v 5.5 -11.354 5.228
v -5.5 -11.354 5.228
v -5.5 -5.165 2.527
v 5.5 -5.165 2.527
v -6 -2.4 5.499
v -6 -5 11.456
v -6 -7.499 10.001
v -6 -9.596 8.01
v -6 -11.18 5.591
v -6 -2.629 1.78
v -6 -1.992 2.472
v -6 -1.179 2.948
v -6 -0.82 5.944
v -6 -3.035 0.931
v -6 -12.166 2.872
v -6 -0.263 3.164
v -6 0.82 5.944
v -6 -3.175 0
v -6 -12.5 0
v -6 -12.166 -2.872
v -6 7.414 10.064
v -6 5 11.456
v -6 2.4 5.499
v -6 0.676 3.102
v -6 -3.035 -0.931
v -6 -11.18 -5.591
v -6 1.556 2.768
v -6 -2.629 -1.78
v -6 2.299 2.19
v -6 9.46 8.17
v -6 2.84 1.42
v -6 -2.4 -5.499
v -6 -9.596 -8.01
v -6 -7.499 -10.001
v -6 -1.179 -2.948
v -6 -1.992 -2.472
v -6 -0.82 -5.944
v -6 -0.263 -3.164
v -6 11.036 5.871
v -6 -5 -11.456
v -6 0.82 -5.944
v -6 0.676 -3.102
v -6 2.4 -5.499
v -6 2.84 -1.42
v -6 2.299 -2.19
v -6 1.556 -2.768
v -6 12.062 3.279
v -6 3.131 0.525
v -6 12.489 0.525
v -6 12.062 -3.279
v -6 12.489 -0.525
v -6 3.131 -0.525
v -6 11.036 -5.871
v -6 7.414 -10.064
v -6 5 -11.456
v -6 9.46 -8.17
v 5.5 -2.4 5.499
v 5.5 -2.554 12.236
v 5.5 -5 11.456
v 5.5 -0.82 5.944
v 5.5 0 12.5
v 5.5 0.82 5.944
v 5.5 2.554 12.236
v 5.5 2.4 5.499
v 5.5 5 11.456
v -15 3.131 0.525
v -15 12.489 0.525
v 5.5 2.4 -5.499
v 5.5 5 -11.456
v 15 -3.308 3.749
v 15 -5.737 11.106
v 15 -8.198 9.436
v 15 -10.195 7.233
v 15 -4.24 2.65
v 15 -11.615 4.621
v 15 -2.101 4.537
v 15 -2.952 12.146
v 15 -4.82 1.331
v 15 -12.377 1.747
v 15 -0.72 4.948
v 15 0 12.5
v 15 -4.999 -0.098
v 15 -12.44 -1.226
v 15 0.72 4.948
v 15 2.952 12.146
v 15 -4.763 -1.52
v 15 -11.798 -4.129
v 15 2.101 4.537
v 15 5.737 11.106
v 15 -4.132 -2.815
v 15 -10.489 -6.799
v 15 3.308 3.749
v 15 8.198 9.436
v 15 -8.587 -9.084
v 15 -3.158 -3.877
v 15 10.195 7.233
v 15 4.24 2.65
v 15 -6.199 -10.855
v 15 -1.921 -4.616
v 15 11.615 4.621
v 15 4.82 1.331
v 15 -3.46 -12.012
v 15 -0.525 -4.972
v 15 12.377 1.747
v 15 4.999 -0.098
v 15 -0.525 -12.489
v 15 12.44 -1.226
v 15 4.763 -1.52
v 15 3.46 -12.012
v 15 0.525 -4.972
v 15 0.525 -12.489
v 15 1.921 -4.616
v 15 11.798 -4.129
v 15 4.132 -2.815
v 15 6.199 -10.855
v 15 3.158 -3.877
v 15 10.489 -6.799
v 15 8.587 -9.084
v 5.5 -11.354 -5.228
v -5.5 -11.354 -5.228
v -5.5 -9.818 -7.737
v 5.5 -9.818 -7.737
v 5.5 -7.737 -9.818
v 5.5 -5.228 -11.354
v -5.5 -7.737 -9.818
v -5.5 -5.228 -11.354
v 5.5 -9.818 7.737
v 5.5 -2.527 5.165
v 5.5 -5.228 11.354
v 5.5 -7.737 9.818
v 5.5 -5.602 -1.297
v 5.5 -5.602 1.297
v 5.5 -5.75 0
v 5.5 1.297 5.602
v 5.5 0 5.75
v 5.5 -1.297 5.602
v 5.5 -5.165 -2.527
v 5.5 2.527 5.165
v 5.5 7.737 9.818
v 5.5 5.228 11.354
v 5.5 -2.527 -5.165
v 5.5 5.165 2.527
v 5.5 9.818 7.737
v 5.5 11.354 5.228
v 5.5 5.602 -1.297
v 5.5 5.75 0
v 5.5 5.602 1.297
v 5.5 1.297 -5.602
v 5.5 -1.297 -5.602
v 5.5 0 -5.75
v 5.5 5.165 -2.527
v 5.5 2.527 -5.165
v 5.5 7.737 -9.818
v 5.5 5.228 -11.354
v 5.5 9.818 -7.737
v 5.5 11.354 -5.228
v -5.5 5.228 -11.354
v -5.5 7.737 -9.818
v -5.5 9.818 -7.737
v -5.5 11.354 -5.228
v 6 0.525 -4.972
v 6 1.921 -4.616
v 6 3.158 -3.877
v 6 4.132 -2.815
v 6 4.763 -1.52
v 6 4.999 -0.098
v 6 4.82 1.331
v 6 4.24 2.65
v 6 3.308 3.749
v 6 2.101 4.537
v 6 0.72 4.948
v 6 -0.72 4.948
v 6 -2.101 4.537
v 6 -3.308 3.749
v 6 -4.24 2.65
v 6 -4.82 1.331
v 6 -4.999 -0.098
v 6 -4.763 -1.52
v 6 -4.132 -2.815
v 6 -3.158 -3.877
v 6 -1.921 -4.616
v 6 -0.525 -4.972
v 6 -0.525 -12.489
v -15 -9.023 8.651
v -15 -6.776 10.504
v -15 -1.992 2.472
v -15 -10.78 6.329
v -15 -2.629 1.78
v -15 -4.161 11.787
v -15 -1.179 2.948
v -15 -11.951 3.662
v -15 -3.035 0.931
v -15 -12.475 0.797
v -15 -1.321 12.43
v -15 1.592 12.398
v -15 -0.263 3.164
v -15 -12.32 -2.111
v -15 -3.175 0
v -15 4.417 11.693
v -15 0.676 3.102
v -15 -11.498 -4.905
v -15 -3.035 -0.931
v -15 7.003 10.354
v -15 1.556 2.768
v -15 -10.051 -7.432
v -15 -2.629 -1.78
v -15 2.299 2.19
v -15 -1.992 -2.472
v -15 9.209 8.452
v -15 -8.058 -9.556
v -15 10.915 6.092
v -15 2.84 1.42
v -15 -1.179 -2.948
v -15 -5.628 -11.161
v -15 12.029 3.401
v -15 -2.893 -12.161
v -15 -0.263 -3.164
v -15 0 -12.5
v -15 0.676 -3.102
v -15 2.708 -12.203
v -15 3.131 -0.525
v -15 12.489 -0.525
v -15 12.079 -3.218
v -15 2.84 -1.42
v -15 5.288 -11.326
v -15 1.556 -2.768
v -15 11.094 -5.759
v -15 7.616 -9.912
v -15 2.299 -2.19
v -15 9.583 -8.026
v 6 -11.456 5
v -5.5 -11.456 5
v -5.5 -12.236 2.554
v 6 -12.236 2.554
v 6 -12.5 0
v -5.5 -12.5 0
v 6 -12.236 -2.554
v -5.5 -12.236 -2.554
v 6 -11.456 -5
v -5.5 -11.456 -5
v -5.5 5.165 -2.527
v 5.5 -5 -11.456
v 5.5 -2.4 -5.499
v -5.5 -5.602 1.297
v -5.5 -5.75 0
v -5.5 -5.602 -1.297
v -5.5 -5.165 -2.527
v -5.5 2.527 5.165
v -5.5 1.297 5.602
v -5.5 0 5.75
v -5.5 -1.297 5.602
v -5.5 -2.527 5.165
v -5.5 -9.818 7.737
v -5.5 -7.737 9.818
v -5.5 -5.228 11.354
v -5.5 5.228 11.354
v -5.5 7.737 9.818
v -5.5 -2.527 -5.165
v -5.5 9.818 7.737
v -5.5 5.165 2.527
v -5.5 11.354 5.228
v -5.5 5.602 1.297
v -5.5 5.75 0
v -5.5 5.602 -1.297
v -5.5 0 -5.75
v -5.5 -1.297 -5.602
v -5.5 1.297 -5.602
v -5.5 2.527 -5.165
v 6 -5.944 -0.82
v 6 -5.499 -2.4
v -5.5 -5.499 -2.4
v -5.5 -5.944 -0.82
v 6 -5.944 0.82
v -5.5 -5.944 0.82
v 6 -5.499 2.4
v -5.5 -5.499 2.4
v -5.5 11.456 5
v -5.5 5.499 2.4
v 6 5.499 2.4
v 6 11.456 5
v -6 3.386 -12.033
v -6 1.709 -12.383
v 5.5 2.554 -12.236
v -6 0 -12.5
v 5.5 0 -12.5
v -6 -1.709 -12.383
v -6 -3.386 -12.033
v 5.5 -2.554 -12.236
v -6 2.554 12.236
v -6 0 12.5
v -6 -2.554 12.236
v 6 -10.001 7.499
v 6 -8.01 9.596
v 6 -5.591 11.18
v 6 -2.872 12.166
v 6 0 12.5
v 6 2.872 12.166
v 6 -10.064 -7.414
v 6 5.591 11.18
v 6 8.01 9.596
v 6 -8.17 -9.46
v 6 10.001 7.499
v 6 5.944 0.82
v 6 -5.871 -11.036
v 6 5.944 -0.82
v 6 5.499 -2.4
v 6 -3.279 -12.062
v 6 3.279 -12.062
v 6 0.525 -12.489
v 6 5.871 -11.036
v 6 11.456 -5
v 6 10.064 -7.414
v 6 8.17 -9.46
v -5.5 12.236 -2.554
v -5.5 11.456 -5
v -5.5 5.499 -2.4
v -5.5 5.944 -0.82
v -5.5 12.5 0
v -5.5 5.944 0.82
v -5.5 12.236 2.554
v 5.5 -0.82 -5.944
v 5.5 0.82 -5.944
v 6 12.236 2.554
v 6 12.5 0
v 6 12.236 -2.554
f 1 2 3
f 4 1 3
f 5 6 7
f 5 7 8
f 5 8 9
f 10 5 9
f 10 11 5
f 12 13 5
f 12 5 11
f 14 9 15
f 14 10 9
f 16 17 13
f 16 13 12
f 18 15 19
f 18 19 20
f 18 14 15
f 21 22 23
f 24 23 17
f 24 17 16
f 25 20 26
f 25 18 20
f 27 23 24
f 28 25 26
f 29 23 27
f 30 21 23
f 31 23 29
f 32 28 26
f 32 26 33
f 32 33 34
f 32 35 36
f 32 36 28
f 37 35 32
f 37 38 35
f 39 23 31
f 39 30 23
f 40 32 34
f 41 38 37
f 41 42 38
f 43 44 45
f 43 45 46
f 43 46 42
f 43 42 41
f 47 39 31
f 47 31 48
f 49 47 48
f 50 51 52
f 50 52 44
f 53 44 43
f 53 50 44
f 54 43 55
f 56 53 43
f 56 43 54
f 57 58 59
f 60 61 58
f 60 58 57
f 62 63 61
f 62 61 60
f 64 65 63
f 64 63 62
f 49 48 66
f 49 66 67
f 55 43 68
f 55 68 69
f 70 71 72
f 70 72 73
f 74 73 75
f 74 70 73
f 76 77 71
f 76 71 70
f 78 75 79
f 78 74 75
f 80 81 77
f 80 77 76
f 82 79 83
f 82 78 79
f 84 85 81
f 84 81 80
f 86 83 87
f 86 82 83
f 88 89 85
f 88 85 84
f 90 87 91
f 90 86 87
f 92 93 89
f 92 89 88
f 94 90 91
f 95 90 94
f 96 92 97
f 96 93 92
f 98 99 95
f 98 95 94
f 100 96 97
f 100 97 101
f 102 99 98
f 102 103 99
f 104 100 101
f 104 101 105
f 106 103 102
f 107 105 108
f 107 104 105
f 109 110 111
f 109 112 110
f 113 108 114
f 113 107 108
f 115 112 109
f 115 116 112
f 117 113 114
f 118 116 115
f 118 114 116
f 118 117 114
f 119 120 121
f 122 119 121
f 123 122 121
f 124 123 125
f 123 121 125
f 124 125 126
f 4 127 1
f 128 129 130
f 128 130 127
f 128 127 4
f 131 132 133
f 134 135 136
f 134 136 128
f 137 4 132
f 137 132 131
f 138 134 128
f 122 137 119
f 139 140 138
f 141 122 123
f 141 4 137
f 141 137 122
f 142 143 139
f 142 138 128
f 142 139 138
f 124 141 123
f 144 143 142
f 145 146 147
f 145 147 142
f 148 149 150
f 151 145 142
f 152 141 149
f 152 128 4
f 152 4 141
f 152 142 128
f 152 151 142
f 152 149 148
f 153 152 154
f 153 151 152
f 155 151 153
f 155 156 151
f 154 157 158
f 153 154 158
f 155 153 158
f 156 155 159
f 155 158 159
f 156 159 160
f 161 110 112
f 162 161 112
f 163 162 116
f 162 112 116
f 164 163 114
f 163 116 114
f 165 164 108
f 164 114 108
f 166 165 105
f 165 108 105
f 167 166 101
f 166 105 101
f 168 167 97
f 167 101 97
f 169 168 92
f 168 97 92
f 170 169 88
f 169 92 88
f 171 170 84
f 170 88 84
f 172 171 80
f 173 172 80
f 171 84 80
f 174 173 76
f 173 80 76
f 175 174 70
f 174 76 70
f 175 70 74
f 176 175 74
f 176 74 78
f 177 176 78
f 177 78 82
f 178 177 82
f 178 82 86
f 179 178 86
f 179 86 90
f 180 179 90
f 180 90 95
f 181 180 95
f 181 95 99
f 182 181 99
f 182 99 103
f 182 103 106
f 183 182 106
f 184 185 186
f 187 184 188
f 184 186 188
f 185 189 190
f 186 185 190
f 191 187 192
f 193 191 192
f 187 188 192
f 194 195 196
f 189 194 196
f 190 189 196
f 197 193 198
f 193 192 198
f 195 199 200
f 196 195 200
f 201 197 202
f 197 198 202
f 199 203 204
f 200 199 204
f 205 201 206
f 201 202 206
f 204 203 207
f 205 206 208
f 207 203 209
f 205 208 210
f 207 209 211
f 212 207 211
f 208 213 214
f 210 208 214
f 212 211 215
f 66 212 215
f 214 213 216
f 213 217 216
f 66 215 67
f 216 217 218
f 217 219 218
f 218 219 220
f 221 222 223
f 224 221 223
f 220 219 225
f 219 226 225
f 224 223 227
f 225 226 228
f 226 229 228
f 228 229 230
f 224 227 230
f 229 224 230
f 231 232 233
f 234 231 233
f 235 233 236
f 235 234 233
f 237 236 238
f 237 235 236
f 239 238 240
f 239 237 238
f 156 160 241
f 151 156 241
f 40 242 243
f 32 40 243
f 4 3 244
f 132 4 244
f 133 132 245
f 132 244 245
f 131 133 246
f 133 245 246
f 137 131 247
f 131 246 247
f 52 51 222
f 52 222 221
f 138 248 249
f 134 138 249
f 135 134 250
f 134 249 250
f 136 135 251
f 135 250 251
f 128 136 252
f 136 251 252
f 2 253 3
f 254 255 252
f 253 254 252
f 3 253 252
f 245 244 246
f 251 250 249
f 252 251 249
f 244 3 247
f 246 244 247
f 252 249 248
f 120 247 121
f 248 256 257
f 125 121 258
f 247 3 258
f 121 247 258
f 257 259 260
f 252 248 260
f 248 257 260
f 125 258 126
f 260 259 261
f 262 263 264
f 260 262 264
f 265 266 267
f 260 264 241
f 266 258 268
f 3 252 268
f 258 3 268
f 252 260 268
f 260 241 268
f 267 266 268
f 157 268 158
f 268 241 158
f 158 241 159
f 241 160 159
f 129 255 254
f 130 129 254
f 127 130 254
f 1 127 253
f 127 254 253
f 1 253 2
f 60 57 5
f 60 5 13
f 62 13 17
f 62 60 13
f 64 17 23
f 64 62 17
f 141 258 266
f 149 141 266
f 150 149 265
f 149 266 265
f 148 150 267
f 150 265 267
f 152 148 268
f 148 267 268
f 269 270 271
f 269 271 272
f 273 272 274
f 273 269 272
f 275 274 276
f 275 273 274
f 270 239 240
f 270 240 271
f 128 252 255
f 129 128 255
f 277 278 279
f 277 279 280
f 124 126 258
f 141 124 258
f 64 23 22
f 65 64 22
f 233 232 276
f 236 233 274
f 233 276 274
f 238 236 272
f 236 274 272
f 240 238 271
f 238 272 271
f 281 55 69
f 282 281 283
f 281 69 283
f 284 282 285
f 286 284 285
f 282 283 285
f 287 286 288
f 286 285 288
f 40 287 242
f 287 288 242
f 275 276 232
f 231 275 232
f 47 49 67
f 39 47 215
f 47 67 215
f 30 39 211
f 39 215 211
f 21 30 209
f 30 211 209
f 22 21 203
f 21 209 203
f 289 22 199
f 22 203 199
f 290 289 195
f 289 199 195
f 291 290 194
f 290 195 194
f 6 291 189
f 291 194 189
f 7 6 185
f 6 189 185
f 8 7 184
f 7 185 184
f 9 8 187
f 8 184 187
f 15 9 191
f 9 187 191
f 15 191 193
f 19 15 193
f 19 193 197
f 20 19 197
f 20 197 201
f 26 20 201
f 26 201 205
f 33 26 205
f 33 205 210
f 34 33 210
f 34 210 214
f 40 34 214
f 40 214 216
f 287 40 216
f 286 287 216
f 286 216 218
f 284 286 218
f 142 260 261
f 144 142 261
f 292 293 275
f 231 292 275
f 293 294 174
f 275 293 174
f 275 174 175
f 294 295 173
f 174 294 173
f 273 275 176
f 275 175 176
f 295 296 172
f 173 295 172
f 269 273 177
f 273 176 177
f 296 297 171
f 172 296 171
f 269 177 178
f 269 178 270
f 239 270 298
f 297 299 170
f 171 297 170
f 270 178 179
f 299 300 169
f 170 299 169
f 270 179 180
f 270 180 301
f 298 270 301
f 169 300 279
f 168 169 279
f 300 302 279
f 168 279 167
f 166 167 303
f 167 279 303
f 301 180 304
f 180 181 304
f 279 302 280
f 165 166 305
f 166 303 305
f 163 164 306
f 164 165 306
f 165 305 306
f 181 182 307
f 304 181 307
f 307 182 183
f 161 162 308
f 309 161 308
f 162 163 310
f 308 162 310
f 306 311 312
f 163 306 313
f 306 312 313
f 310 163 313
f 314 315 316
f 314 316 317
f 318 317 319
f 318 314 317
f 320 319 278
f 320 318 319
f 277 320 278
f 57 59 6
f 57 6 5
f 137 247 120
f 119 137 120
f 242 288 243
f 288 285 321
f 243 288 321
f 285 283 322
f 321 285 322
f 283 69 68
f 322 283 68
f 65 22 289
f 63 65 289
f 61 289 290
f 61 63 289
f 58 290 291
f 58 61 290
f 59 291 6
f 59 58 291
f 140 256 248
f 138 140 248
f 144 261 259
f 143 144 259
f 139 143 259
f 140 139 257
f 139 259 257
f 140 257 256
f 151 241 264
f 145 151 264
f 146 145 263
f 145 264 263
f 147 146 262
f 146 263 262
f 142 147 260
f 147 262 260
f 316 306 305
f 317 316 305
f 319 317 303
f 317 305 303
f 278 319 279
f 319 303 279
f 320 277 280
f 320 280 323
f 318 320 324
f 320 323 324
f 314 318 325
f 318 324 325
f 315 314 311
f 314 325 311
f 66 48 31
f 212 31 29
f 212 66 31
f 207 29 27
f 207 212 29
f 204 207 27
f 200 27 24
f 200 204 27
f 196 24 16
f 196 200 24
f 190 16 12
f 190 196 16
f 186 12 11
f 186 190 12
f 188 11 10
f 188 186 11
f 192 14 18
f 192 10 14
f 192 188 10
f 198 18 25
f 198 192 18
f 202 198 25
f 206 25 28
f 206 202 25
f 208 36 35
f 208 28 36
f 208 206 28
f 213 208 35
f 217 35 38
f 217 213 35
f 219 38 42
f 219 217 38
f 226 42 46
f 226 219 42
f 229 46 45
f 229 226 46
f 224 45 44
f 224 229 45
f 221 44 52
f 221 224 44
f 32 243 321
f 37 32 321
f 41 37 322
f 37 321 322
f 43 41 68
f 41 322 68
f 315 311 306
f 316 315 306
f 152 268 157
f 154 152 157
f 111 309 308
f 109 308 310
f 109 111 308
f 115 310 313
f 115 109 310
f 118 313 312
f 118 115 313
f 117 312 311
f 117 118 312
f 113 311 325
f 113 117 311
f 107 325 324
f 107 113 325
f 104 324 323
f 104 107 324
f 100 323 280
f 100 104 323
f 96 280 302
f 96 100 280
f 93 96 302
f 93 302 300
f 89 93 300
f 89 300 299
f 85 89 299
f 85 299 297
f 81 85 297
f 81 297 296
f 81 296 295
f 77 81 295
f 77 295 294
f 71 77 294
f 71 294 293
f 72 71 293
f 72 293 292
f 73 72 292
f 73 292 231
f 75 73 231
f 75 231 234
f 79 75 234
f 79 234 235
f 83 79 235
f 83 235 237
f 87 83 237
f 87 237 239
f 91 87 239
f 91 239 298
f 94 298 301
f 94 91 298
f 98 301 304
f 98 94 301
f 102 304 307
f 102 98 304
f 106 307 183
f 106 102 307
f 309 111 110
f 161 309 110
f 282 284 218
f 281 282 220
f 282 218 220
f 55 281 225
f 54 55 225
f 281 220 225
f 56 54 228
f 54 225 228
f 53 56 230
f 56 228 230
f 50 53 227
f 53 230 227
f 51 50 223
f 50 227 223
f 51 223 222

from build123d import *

# Parameters (mm, degrees)
SKETCH1_R           = 12.5
SKETCH1_R_2         = 5
BOSS_EXTRUDE1_DEPTH = 9
BOSS_EXTRUDE3_DEPTH = 11.5
CUT_EXTRUDE1_DEPTH  = 28.069355367
SKETCH5_R           = 12.5
SKETCH5_R_2         = 3.175
BOSS_EXTRUDE5_DEPTH = 9
CUT_EXTRUDE2_START  = -9
CUT_EXTRUDE2_DEPTH  = 9
BOSS_EXTRUDE6_START = 11.5
BOSS_EXTRUDE6_DEPTH = 11.5
BOSS_EXTRUDE7_DEPTH = 11


with BuildPart() as part:
    # Sketch1 → Boss-Extrude1 (new body)
    with BuildSketch(Plane(origin=(15, 0, 0), x_dir=(0, 0, -1), z_dir=(1, 0, 0))):
        Circle(SKETCH1_R)
        Circle(SKETCH1_R_2, mode=Mode.SUBTRACT)
    extrude(amount=-BOSS_EXTRUDE1_DEPTH)

    # Sketch3 → Boss-Extrude3 (add)
    with BuildSketch(Plane.ZY.offset(-6)):
        with BuildLine():
            Line((2.4, 5.499090834), (5, 11.456439237))
            ThreePointArc((5, 11.456439237), (0, 12.5), (-5, 11.456439237))
            Line((-5, 11.456439237), (-2.4, 5.499090834))
            ThreePointArc((-2.4, 5.499090834), (0, 6), (2.4, 5.499090834))
        make_face()
        with BuildLine():
            Line((2.4, -5.499090834), (5, -11.456439237))
            ThreePointArc((5, -11.456439237), (0, -12.5), (-5, -11.456439237))
            Line((-5, -11.456439237), (-2.4, -5.499090834))
            ThreePointArc((-2.4, -5.499090834), (0, -6), (2.4, -5.499090834))
        make_face()
    extrude(amount=BOSS_EXTRUDE3_DEPTH)

    # Sketch4 → Cut-Extrude1 (cut, through all)
    with BuildSketch(Plane(origin=(15, 0, 0), x_dir=(0, 0, -1), z_dir=(1, 0, 0))):
        with BuildLine():
            Line((4.972361109, -0.525), (12.488970134, -0.525))
            ThreePointArc((12.488970134, -0.525), (12.5, 0), (12.488970134, 0.525))
            Line((12.488970134, 0.525), (4.972361109, 0.525))
            ThreePointArc((4.972361109, 0.525), (5, 0), (4.972361109, -0.525))
        make_face()
    extrude(amount=-CUT_EXTRUDE1_DEPTH, mode=Mode.SUBTRACT)


with BuildPart() as body_2:
    # Sketch5 → Boss-Extrude5 (new body)
    with BuildSketch(Plane(origin=(-15, 0, 0), x_dir=(0, 0, -1), z_dir=(1, 0, 0))):
        Circle(SKETCH5_R)
        Circle(SKETCH5_R_2, mode=Mode.SUBTRACT)
    extrude(amount=BOSS_EXTRUDE5_DEPTH)

    # Sketch6 → Cut-Extrude2 (cut)
    with BuildSketch(Plane.ZY.offset(15).offset(CUT_EXTRUDE2_START)):
        with BuildLine():
            Line((0.525, 3.131293662), (0.525, 12.488970134))
            ThreePointArc((0.525, 12.488970134), (0, 12.5), (-0.525, 12.488970134))
            Line((-0.525, 12.488970134), (-0.525, 3.131293662))
            ThreePointArc((-0.525, 3.131293662), (0, 3.175), (0.525, 3.131293662))
        make_face()
    extrude(amount=CUT_EXTRUDE2_DEPTH, mode=Mode.SUBTRACT)

    # Sketch7 → Boss-Extrude6 (add)
    with BuildSketch(Plane(origin=(-6, 0, 0), x_dir=(0, 0, -1), z_dir=(1, 0, 0)).offset(BOSS_EXTRUDE6_START)):
        with BuildLine():
            Line((5.499090834, 2.4), (11.456439237, 5))
            ThreePointArc((11.456439237, 5), (12.5, 0), (11.456439237, -5))
            Line((11.456439237, -5), (5.499090834, -2.4))
            ThreePointArc((5.499090834, -2.4), (6, 0), (5.499090834, 2.4))
        make_face()
        with BuildLine():
            Line((-5.499090834, 2.4), (-11.456439237, 5))
            ThreePointArc((-11.456439237, 5), (-12.5, 0), (-11.456439237, -5))
            Line((-11.456439237, -5), (-5.499090834, -2.4))
            ThreePointArc((-5.499090834, -2.4), (-6, 0), (-5.499090834, 2.4))
        make_face()
    extrude(amount=-BOSS_EXTRUDE6_DEPTH)


with BuildPart() as body_3:
    # Sketch8 → Boss-Extrude7 (new body)
    with BuildSketch(Plane.ZY.offset(5.5)):
        with BuildLine():
            Line((5.228128685, -11.35414772), (2.526953843, -5.164978632))
            ThreePointArc((2.526953843, -5.164978632), (0, -5.75), (-2.526953843, -5.164978632))
            Line((-2.526953843, -5.164978632), (-5.228128685, -11.35414772))
            ThreePointArc((-5.228128685, -11.35414772), (-8.838834765, -8.838834765), (-11.35414772, -5.228128685))
            Line((-11.35414772, -5.228128685), (-5.164978632, -2.526953843))
            ThreePointArc((-5.164978632, -2.526953843), (-5.75, 0), (-5.164978632, 2.526953843))
            Line((-5.164978632, 2.526953843), (-11.35414772, 5.228128685))
            ThreePointArc((-11.35414772, 5.228128685), (-8.838834765, 8.838834765), (-5.228128685, 11.35414772))
            Line((-5.228128685, 11.35414772), (-2.526953843, 5.164978632))
            ThreePointArc((-2.526953843, 5.164978632), (0, 5.75), (2.526953843, 5.164978632))
            Line((2.526953843, 5.164978632), (5.228128685, 11.35414772))
            ThreePointArc((5.228128685, 11.35414772), (8.838834765, 8.838834765), (11.35414772, 5.228128685))
            Line((11.35414772, 5.228128685), (5.164978632, 2.526953843))
            ThreePointArc((5.164978632, 2.526953843), (5.75, 0), (5.164978632, -2.526953843))
            Line((5.164978632, -2.526953843), (11.35414772, -5.228128685))
            ThreePointArc((11.35414772, -5.228128685), (8.838834765, -8.838834765), (5.228128685, -11.35414772))
        make_face()
    extrude(amount=-BOSS_EXTRUDE7_DEPTH)


solid = Compound([part.part, body_2.part, body_3.part])
